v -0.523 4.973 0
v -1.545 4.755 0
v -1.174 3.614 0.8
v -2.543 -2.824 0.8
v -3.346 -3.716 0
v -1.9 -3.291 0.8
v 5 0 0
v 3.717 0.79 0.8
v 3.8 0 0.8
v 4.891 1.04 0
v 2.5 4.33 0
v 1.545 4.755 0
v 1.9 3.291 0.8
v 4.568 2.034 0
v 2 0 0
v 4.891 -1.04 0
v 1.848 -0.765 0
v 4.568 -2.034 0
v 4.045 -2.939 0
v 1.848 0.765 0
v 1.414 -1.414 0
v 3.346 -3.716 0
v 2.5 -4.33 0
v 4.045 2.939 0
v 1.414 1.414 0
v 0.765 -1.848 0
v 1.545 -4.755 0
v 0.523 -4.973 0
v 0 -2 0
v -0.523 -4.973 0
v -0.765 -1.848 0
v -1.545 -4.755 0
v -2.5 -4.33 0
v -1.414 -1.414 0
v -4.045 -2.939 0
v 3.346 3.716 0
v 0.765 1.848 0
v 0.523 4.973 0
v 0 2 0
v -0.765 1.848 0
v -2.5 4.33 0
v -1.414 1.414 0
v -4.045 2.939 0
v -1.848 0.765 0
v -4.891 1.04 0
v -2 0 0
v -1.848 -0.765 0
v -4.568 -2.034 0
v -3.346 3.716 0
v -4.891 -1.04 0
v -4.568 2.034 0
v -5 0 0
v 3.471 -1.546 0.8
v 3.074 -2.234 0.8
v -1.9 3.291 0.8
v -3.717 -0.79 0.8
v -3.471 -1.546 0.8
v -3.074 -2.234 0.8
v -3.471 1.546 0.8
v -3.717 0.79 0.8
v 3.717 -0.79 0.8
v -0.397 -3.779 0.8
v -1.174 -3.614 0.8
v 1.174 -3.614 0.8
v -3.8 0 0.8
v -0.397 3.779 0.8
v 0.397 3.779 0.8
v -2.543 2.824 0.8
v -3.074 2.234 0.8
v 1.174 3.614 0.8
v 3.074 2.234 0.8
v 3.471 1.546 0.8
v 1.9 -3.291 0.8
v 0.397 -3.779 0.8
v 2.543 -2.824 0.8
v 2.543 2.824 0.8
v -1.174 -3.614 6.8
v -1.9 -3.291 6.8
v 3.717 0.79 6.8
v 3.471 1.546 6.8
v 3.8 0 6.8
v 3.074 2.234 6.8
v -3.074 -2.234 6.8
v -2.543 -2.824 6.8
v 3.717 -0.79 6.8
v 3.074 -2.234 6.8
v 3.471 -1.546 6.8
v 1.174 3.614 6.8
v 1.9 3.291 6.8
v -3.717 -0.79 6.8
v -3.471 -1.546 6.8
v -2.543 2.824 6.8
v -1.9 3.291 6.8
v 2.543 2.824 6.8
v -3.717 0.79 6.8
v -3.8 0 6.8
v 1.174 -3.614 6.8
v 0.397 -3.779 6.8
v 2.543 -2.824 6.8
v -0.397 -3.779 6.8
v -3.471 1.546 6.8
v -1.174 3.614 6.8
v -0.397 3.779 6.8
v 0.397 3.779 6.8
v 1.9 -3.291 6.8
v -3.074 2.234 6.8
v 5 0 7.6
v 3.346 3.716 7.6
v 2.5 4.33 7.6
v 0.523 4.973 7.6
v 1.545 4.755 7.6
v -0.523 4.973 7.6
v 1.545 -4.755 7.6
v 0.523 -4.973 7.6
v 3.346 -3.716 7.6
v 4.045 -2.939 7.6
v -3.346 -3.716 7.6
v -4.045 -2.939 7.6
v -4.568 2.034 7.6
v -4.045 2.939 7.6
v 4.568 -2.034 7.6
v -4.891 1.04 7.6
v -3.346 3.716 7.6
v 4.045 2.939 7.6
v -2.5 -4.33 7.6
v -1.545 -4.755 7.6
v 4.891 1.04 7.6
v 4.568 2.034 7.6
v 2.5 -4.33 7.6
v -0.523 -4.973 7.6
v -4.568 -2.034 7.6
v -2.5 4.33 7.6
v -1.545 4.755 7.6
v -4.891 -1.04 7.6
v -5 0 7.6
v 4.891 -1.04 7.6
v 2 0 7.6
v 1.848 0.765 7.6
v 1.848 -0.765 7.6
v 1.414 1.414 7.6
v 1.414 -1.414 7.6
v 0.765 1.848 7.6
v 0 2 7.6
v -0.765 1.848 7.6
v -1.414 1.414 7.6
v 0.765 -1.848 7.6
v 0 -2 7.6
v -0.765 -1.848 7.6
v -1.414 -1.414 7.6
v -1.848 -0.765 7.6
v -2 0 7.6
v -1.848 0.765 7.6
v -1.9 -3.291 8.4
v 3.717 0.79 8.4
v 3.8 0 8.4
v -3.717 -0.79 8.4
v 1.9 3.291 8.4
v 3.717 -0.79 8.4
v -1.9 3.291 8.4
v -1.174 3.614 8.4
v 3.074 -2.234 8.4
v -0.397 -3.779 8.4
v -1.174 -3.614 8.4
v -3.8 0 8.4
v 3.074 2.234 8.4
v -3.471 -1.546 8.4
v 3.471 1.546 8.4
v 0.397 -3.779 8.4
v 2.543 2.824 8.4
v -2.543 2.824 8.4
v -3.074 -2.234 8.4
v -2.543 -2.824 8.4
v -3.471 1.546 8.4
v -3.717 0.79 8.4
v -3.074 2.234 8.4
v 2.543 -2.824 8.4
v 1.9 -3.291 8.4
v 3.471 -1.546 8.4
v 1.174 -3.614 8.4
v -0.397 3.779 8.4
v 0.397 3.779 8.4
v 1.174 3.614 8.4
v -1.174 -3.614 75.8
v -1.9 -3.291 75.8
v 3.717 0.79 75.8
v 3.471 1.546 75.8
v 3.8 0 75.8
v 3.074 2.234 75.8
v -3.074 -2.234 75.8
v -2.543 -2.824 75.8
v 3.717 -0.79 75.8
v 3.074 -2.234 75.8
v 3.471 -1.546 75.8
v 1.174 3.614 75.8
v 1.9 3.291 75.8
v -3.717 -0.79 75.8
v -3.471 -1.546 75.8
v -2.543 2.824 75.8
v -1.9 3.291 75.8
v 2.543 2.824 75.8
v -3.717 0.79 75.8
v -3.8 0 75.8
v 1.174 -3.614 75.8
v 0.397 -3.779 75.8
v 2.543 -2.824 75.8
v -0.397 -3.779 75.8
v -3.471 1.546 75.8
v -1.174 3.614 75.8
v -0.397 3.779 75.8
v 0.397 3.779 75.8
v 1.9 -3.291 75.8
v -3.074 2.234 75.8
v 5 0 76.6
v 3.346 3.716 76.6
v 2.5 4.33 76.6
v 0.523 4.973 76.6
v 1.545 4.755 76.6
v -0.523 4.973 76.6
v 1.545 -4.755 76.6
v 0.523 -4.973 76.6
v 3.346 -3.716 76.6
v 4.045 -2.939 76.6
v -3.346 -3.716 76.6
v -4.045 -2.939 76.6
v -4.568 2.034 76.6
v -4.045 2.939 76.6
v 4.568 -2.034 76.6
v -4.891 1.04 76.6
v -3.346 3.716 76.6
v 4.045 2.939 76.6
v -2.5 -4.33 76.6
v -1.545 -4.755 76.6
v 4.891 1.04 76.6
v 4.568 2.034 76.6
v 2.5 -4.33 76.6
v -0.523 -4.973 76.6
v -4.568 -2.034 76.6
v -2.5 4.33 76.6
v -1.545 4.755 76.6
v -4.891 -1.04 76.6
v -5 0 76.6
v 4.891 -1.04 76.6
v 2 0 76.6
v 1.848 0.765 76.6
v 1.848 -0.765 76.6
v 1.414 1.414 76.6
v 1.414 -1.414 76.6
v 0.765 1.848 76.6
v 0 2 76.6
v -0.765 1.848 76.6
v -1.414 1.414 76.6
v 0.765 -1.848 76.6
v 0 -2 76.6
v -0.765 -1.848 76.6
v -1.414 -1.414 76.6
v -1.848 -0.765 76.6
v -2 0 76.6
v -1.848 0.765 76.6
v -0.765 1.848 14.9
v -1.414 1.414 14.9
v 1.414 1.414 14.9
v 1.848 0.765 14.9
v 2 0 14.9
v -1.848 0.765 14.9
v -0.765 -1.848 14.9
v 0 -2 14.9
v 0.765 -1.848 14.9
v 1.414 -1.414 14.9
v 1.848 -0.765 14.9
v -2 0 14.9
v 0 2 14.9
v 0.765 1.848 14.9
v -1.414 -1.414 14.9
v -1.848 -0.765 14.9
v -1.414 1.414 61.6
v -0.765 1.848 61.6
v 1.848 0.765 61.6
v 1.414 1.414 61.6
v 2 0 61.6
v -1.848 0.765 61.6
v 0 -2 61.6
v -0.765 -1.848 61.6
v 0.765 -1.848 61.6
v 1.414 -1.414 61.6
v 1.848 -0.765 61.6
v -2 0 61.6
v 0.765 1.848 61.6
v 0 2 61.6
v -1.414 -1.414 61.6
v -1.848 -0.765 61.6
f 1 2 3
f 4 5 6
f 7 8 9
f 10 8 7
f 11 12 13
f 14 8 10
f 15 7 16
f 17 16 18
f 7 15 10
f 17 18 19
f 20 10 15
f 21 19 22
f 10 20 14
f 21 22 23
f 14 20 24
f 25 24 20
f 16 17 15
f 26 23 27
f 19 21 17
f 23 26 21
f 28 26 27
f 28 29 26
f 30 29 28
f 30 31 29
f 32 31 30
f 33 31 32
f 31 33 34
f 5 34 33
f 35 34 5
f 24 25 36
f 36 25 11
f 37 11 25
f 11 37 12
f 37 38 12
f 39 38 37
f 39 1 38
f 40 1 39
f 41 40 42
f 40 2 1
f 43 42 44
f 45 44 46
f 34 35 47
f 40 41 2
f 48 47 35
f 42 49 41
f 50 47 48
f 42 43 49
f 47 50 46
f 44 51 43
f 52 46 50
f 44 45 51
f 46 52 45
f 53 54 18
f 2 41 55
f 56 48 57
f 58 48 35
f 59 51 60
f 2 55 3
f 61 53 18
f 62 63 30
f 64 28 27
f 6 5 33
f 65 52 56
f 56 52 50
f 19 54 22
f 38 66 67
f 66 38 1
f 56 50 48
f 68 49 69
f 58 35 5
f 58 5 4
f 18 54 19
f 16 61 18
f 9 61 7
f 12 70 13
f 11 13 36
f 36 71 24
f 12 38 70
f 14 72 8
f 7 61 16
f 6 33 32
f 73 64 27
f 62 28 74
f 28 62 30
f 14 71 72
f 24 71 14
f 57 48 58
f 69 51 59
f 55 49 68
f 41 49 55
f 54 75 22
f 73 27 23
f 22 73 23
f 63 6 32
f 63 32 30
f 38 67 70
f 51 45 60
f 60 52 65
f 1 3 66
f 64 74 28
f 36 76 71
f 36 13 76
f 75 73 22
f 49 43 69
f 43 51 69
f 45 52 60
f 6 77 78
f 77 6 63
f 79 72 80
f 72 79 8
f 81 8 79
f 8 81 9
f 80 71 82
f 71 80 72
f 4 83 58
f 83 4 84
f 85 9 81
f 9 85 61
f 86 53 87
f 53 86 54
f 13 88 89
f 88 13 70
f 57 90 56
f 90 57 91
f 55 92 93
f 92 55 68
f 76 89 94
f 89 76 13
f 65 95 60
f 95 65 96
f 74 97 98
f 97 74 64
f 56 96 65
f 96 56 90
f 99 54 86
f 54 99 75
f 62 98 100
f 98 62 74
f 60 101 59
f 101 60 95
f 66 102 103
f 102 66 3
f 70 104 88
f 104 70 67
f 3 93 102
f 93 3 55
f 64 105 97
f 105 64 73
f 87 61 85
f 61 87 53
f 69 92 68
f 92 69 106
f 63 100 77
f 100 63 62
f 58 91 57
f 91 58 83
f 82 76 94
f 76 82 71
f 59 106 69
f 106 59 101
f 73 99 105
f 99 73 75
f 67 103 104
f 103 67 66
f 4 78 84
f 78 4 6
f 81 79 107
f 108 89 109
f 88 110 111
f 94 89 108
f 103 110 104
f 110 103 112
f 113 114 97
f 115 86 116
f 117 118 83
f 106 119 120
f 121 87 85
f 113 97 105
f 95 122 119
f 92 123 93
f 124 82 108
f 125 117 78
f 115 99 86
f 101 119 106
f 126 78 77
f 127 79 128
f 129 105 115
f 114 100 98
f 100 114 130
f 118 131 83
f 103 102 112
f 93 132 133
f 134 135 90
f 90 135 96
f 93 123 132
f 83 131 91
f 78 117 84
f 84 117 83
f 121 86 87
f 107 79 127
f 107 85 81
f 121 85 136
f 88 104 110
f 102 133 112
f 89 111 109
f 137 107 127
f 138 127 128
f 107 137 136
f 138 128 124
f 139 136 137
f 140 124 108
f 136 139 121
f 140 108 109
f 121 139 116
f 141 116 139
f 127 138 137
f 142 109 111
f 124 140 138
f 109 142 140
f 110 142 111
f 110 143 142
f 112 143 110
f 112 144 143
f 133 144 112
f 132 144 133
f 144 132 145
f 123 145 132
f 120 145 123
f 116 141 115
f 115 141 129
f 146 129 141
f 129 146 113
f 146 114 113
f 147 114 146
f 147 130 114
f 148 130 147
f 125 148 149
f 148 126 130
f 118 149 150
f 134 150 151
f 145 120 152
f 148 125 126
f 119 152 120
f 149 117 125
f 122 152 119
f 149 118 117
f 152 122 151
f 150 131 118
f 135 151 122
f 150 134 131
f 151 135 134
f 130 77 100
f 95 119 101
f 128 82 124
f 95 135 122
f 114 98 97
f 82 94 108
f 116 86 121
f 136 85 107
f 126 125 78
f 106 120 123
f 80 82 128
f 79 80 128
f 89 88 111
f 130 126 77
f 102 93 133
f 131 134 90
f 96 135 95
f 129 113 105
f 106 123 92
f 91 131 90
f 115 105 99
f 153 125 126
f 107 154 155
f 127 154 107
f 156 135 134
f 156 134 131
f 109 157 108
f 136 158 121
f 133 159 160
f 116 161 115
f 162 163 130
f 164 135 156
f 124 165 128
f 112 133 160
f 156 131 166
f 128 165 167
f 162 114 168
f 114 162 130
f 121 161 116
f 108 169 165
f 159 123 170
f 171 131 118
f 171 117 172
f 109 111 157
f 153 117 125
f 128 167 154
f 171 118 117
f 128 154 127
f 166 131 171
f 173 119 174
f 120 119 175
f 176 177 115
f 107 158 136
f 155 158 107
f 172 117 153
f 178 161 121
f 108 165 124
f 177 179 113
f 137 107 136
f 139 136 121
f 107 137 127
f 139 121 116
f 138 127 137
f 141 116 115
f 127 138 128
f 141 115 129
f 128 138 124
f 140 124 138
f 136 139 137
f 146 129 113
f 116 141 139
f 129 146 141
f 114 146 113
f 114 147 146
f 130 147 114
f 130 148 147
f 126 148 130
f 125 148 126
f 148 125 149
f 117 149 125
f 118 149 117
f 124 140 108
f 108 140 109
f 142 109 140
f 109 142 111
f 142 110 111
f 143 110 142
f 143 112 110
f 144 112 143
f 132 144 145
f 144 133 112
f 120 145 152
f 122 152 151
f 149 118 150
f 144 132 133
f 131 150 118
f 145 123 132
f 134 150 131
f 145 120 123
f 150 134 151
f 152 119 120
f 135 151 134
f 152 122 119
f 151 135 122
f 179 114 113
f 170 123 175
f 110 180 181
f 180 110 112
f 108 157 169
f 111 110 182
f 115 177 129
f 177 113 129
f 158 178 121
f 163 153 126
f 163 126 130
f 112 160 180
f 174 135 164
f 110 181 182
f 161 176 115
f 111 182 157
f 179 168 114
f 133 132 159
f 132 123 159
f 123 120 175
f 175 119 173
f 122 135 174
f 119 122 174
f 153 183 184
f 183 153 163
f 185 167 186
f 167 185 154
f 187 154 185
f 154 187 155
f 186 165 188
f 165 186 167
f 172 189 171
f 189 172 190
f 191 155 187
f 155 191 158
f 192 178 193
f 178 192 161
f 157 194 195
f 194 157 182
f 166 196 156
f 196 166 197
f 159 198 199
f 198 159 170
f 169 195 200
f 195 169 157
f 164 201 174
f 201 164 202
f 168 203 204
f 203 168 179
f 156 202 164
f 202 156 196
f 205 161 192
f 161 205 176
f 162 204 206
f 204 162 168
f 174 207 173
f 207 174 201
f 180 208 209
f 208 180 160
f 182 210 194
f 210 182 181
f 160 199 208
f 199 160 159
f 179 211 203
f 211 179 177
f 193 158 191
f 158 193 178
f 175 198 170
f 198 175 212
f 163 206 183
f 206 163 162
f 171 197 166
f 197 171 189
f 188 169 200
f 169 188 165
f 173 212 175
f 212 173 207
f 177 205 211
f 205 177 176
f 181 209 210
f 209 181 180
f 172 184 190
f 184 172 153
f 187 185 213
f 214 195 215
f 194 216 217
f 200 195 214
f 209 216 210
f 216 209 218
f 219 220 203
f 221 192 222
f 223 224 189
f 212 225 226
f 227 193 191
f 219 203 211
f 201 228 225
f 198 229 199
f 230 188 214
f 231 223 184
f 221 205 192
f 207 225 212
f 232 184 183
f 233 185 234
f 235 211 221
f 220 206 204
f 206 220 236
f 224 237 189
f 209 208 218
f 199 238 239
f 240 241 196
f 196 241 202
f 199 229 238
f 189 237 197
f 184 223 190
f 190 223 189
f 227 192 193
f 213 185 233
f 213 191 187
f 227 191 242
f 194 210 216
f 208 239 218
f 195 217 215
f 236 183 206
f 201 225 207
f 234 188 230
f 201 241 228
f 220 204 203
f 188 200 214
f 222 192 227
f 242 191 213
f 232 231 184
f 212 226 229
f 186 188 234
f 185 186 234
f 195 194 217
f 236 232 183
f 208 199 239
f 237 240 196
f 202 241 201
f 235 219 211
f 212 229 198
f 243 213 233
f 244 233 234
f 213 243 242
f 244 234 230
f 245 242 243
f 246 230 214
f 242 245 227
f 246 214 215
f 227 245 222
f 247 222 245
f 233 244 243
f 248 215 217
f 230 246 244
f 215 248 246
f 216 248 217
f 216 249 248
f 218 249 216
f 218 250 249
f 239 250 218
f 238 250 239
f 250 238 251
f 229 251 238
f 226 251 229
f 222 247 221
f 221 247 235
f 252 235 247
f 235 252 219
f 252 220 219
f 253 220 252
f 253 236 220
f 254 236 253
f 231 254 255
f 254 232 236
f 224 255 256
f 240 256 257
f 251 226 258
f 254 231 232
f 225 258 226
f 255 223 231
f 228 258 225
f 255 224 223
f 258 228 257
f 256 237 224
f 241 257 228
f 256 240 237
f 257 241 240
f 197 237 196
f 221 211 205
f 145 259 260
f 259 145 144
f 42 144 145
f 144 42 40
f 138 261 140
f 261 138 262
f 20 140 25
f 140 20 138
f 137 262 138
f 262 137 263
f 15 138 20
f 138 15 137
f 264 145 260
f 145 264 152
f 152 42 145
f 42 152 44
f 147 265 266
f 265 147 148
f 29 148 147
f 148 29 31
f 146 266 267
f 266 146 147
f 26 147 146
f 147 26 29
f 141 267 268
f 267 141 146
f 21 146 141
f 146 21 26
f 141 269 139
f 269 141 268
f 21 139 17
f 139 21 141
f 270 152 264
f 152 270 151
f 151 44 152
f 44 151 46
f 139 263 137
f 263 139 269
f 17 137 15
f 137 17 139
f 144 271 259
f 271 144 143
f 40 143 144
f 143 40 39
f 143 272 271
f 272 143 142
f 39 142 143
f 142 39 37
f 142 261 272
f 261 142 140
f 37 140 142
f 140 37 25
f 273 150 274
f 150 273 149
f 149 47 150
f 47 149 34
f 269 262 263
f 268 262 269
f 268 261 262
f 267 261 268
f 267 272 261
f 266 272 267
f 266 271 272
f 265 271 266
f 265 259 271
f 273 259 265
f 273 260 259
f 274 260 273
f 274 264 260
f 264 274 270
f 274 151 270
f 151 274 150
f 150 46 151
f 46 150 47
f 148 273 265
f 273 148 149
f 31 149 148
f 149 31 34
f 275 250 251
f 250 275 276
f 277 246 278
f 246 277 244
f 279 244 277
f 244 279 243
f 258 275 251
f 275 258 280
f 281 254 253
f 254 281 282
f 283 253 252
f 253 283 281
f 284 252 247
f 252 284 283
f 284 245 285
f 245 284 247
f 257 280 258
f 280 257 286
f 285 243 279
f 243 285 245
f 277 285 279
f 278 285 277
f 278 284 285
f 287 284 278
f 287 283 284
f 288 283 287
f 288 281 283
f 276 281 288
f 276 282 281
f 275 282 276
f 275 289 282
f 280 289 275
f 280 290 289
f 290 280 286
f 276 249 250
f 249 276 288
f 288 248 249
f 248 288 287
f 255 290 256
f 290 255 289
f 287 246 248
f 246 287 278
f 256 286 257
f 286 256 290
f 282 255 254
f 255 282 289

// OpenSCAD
heightEdge = 0.8;

spoolTotalHeight = 75;
spoolCylinderOuterRadius = 5;

spoolCylinderHeight = heightEdge * 2 + spoolTotalHeight;


SCMountHeight = 20;
SCMountThickness = 2;
SCMountDistance = 100;

filamentAxisDepth = 15;

$fs = 0.8;

module edgedCylinder(r = 10, ri, he = heightEdge, h = 10) {
	ri = (ri == undef ? r - 1.2 : ri);
	cylinder(r1 = r, r2 = ri, h = he);
	translate([0, 0, he]) cylinder(r = ri, h = h - 2*he);
	translate([0, 0, h - he]) cylinder(r1 = ri, r2 = r, h = he);
}

module spoolCylinder() {
	difference() {
		union() {
			edgedCylinder(r = spoolCylinderOuterRadius, h = heightEdge * 2 + 6);
			translate([0, 0, heightEdge * 2 + 6]) edgedCylinder(r = spoolCylinderOuterRadius, h = spoolTotalHeight - 6);
		}
		
		translate([0, 0, -0.1]) cylinder(d = 4, h = filamentAxisDepth);
		translate([0, 0, spoolCylinderHeight - filamentAxisDepth]) cylinder(d = 4, h = 100);
	}
}

module SCMount() {
	translate([0, 0, SCMountHeight]) rotate([0, 90, 0]) difference() {
		union() {
			cylinder(r = spoolCylinderOuterRadius, h = SCMountThickness);
			translate([0, -spoolCylinderOuterRadius, 0]) cube([SCMountHeight, spoolCylinderOuterRadius*2, SCMountThickness]);
		}
		
		translate([0, 0, -0.1]) cylinder(d = 3.5, h = 10);
	}
}

module SCMounts() {
	translate([0, spoolCylinderOuterRadius, -0.001]) {
		SCMount();
		translate([SCMountThickness + spoolCylinderHeight, 0, 0]) SCMount();
		
		translate([0, SCMountDistance, 0]) SCMount();
		translate([SCMountThickness + spoolCylinderHeight, SCMountDistance, 0]) SCMount();
	}
}

module SCBase() {
	SCMounts();
	translate([spoolCylinderHeight/2 - 15/2, -30, -2]) FilamentGuide();
	
	difference() {
		translate([0, 0, -2]) cube([SCMountThickness*2 + spoolCylinderHeight, SCMountDistance + 2*spoolCylinderOuterRadius, 2]);
		translate([spoolCylinderOuterRadius*2, spoolCylinderOuterRadius*2, -3]) cube([SCMountThickness*2 + spoolCylinderHeight - spoolCylinderOuterRadius*4, SCMountDistance - spoolCylinderOuterRadius*2, 10]);
	}
}

module FilamentGuide() {
	cube([15, 30, 2]);
	difference() {
		cube([15, 2, 20]);
		translate([15/2, 5, 20 - 15/2]) #rotate([90, 0, 0]) cylinder(d = 4, h = 10);
	}
}

spoolCylinder();
